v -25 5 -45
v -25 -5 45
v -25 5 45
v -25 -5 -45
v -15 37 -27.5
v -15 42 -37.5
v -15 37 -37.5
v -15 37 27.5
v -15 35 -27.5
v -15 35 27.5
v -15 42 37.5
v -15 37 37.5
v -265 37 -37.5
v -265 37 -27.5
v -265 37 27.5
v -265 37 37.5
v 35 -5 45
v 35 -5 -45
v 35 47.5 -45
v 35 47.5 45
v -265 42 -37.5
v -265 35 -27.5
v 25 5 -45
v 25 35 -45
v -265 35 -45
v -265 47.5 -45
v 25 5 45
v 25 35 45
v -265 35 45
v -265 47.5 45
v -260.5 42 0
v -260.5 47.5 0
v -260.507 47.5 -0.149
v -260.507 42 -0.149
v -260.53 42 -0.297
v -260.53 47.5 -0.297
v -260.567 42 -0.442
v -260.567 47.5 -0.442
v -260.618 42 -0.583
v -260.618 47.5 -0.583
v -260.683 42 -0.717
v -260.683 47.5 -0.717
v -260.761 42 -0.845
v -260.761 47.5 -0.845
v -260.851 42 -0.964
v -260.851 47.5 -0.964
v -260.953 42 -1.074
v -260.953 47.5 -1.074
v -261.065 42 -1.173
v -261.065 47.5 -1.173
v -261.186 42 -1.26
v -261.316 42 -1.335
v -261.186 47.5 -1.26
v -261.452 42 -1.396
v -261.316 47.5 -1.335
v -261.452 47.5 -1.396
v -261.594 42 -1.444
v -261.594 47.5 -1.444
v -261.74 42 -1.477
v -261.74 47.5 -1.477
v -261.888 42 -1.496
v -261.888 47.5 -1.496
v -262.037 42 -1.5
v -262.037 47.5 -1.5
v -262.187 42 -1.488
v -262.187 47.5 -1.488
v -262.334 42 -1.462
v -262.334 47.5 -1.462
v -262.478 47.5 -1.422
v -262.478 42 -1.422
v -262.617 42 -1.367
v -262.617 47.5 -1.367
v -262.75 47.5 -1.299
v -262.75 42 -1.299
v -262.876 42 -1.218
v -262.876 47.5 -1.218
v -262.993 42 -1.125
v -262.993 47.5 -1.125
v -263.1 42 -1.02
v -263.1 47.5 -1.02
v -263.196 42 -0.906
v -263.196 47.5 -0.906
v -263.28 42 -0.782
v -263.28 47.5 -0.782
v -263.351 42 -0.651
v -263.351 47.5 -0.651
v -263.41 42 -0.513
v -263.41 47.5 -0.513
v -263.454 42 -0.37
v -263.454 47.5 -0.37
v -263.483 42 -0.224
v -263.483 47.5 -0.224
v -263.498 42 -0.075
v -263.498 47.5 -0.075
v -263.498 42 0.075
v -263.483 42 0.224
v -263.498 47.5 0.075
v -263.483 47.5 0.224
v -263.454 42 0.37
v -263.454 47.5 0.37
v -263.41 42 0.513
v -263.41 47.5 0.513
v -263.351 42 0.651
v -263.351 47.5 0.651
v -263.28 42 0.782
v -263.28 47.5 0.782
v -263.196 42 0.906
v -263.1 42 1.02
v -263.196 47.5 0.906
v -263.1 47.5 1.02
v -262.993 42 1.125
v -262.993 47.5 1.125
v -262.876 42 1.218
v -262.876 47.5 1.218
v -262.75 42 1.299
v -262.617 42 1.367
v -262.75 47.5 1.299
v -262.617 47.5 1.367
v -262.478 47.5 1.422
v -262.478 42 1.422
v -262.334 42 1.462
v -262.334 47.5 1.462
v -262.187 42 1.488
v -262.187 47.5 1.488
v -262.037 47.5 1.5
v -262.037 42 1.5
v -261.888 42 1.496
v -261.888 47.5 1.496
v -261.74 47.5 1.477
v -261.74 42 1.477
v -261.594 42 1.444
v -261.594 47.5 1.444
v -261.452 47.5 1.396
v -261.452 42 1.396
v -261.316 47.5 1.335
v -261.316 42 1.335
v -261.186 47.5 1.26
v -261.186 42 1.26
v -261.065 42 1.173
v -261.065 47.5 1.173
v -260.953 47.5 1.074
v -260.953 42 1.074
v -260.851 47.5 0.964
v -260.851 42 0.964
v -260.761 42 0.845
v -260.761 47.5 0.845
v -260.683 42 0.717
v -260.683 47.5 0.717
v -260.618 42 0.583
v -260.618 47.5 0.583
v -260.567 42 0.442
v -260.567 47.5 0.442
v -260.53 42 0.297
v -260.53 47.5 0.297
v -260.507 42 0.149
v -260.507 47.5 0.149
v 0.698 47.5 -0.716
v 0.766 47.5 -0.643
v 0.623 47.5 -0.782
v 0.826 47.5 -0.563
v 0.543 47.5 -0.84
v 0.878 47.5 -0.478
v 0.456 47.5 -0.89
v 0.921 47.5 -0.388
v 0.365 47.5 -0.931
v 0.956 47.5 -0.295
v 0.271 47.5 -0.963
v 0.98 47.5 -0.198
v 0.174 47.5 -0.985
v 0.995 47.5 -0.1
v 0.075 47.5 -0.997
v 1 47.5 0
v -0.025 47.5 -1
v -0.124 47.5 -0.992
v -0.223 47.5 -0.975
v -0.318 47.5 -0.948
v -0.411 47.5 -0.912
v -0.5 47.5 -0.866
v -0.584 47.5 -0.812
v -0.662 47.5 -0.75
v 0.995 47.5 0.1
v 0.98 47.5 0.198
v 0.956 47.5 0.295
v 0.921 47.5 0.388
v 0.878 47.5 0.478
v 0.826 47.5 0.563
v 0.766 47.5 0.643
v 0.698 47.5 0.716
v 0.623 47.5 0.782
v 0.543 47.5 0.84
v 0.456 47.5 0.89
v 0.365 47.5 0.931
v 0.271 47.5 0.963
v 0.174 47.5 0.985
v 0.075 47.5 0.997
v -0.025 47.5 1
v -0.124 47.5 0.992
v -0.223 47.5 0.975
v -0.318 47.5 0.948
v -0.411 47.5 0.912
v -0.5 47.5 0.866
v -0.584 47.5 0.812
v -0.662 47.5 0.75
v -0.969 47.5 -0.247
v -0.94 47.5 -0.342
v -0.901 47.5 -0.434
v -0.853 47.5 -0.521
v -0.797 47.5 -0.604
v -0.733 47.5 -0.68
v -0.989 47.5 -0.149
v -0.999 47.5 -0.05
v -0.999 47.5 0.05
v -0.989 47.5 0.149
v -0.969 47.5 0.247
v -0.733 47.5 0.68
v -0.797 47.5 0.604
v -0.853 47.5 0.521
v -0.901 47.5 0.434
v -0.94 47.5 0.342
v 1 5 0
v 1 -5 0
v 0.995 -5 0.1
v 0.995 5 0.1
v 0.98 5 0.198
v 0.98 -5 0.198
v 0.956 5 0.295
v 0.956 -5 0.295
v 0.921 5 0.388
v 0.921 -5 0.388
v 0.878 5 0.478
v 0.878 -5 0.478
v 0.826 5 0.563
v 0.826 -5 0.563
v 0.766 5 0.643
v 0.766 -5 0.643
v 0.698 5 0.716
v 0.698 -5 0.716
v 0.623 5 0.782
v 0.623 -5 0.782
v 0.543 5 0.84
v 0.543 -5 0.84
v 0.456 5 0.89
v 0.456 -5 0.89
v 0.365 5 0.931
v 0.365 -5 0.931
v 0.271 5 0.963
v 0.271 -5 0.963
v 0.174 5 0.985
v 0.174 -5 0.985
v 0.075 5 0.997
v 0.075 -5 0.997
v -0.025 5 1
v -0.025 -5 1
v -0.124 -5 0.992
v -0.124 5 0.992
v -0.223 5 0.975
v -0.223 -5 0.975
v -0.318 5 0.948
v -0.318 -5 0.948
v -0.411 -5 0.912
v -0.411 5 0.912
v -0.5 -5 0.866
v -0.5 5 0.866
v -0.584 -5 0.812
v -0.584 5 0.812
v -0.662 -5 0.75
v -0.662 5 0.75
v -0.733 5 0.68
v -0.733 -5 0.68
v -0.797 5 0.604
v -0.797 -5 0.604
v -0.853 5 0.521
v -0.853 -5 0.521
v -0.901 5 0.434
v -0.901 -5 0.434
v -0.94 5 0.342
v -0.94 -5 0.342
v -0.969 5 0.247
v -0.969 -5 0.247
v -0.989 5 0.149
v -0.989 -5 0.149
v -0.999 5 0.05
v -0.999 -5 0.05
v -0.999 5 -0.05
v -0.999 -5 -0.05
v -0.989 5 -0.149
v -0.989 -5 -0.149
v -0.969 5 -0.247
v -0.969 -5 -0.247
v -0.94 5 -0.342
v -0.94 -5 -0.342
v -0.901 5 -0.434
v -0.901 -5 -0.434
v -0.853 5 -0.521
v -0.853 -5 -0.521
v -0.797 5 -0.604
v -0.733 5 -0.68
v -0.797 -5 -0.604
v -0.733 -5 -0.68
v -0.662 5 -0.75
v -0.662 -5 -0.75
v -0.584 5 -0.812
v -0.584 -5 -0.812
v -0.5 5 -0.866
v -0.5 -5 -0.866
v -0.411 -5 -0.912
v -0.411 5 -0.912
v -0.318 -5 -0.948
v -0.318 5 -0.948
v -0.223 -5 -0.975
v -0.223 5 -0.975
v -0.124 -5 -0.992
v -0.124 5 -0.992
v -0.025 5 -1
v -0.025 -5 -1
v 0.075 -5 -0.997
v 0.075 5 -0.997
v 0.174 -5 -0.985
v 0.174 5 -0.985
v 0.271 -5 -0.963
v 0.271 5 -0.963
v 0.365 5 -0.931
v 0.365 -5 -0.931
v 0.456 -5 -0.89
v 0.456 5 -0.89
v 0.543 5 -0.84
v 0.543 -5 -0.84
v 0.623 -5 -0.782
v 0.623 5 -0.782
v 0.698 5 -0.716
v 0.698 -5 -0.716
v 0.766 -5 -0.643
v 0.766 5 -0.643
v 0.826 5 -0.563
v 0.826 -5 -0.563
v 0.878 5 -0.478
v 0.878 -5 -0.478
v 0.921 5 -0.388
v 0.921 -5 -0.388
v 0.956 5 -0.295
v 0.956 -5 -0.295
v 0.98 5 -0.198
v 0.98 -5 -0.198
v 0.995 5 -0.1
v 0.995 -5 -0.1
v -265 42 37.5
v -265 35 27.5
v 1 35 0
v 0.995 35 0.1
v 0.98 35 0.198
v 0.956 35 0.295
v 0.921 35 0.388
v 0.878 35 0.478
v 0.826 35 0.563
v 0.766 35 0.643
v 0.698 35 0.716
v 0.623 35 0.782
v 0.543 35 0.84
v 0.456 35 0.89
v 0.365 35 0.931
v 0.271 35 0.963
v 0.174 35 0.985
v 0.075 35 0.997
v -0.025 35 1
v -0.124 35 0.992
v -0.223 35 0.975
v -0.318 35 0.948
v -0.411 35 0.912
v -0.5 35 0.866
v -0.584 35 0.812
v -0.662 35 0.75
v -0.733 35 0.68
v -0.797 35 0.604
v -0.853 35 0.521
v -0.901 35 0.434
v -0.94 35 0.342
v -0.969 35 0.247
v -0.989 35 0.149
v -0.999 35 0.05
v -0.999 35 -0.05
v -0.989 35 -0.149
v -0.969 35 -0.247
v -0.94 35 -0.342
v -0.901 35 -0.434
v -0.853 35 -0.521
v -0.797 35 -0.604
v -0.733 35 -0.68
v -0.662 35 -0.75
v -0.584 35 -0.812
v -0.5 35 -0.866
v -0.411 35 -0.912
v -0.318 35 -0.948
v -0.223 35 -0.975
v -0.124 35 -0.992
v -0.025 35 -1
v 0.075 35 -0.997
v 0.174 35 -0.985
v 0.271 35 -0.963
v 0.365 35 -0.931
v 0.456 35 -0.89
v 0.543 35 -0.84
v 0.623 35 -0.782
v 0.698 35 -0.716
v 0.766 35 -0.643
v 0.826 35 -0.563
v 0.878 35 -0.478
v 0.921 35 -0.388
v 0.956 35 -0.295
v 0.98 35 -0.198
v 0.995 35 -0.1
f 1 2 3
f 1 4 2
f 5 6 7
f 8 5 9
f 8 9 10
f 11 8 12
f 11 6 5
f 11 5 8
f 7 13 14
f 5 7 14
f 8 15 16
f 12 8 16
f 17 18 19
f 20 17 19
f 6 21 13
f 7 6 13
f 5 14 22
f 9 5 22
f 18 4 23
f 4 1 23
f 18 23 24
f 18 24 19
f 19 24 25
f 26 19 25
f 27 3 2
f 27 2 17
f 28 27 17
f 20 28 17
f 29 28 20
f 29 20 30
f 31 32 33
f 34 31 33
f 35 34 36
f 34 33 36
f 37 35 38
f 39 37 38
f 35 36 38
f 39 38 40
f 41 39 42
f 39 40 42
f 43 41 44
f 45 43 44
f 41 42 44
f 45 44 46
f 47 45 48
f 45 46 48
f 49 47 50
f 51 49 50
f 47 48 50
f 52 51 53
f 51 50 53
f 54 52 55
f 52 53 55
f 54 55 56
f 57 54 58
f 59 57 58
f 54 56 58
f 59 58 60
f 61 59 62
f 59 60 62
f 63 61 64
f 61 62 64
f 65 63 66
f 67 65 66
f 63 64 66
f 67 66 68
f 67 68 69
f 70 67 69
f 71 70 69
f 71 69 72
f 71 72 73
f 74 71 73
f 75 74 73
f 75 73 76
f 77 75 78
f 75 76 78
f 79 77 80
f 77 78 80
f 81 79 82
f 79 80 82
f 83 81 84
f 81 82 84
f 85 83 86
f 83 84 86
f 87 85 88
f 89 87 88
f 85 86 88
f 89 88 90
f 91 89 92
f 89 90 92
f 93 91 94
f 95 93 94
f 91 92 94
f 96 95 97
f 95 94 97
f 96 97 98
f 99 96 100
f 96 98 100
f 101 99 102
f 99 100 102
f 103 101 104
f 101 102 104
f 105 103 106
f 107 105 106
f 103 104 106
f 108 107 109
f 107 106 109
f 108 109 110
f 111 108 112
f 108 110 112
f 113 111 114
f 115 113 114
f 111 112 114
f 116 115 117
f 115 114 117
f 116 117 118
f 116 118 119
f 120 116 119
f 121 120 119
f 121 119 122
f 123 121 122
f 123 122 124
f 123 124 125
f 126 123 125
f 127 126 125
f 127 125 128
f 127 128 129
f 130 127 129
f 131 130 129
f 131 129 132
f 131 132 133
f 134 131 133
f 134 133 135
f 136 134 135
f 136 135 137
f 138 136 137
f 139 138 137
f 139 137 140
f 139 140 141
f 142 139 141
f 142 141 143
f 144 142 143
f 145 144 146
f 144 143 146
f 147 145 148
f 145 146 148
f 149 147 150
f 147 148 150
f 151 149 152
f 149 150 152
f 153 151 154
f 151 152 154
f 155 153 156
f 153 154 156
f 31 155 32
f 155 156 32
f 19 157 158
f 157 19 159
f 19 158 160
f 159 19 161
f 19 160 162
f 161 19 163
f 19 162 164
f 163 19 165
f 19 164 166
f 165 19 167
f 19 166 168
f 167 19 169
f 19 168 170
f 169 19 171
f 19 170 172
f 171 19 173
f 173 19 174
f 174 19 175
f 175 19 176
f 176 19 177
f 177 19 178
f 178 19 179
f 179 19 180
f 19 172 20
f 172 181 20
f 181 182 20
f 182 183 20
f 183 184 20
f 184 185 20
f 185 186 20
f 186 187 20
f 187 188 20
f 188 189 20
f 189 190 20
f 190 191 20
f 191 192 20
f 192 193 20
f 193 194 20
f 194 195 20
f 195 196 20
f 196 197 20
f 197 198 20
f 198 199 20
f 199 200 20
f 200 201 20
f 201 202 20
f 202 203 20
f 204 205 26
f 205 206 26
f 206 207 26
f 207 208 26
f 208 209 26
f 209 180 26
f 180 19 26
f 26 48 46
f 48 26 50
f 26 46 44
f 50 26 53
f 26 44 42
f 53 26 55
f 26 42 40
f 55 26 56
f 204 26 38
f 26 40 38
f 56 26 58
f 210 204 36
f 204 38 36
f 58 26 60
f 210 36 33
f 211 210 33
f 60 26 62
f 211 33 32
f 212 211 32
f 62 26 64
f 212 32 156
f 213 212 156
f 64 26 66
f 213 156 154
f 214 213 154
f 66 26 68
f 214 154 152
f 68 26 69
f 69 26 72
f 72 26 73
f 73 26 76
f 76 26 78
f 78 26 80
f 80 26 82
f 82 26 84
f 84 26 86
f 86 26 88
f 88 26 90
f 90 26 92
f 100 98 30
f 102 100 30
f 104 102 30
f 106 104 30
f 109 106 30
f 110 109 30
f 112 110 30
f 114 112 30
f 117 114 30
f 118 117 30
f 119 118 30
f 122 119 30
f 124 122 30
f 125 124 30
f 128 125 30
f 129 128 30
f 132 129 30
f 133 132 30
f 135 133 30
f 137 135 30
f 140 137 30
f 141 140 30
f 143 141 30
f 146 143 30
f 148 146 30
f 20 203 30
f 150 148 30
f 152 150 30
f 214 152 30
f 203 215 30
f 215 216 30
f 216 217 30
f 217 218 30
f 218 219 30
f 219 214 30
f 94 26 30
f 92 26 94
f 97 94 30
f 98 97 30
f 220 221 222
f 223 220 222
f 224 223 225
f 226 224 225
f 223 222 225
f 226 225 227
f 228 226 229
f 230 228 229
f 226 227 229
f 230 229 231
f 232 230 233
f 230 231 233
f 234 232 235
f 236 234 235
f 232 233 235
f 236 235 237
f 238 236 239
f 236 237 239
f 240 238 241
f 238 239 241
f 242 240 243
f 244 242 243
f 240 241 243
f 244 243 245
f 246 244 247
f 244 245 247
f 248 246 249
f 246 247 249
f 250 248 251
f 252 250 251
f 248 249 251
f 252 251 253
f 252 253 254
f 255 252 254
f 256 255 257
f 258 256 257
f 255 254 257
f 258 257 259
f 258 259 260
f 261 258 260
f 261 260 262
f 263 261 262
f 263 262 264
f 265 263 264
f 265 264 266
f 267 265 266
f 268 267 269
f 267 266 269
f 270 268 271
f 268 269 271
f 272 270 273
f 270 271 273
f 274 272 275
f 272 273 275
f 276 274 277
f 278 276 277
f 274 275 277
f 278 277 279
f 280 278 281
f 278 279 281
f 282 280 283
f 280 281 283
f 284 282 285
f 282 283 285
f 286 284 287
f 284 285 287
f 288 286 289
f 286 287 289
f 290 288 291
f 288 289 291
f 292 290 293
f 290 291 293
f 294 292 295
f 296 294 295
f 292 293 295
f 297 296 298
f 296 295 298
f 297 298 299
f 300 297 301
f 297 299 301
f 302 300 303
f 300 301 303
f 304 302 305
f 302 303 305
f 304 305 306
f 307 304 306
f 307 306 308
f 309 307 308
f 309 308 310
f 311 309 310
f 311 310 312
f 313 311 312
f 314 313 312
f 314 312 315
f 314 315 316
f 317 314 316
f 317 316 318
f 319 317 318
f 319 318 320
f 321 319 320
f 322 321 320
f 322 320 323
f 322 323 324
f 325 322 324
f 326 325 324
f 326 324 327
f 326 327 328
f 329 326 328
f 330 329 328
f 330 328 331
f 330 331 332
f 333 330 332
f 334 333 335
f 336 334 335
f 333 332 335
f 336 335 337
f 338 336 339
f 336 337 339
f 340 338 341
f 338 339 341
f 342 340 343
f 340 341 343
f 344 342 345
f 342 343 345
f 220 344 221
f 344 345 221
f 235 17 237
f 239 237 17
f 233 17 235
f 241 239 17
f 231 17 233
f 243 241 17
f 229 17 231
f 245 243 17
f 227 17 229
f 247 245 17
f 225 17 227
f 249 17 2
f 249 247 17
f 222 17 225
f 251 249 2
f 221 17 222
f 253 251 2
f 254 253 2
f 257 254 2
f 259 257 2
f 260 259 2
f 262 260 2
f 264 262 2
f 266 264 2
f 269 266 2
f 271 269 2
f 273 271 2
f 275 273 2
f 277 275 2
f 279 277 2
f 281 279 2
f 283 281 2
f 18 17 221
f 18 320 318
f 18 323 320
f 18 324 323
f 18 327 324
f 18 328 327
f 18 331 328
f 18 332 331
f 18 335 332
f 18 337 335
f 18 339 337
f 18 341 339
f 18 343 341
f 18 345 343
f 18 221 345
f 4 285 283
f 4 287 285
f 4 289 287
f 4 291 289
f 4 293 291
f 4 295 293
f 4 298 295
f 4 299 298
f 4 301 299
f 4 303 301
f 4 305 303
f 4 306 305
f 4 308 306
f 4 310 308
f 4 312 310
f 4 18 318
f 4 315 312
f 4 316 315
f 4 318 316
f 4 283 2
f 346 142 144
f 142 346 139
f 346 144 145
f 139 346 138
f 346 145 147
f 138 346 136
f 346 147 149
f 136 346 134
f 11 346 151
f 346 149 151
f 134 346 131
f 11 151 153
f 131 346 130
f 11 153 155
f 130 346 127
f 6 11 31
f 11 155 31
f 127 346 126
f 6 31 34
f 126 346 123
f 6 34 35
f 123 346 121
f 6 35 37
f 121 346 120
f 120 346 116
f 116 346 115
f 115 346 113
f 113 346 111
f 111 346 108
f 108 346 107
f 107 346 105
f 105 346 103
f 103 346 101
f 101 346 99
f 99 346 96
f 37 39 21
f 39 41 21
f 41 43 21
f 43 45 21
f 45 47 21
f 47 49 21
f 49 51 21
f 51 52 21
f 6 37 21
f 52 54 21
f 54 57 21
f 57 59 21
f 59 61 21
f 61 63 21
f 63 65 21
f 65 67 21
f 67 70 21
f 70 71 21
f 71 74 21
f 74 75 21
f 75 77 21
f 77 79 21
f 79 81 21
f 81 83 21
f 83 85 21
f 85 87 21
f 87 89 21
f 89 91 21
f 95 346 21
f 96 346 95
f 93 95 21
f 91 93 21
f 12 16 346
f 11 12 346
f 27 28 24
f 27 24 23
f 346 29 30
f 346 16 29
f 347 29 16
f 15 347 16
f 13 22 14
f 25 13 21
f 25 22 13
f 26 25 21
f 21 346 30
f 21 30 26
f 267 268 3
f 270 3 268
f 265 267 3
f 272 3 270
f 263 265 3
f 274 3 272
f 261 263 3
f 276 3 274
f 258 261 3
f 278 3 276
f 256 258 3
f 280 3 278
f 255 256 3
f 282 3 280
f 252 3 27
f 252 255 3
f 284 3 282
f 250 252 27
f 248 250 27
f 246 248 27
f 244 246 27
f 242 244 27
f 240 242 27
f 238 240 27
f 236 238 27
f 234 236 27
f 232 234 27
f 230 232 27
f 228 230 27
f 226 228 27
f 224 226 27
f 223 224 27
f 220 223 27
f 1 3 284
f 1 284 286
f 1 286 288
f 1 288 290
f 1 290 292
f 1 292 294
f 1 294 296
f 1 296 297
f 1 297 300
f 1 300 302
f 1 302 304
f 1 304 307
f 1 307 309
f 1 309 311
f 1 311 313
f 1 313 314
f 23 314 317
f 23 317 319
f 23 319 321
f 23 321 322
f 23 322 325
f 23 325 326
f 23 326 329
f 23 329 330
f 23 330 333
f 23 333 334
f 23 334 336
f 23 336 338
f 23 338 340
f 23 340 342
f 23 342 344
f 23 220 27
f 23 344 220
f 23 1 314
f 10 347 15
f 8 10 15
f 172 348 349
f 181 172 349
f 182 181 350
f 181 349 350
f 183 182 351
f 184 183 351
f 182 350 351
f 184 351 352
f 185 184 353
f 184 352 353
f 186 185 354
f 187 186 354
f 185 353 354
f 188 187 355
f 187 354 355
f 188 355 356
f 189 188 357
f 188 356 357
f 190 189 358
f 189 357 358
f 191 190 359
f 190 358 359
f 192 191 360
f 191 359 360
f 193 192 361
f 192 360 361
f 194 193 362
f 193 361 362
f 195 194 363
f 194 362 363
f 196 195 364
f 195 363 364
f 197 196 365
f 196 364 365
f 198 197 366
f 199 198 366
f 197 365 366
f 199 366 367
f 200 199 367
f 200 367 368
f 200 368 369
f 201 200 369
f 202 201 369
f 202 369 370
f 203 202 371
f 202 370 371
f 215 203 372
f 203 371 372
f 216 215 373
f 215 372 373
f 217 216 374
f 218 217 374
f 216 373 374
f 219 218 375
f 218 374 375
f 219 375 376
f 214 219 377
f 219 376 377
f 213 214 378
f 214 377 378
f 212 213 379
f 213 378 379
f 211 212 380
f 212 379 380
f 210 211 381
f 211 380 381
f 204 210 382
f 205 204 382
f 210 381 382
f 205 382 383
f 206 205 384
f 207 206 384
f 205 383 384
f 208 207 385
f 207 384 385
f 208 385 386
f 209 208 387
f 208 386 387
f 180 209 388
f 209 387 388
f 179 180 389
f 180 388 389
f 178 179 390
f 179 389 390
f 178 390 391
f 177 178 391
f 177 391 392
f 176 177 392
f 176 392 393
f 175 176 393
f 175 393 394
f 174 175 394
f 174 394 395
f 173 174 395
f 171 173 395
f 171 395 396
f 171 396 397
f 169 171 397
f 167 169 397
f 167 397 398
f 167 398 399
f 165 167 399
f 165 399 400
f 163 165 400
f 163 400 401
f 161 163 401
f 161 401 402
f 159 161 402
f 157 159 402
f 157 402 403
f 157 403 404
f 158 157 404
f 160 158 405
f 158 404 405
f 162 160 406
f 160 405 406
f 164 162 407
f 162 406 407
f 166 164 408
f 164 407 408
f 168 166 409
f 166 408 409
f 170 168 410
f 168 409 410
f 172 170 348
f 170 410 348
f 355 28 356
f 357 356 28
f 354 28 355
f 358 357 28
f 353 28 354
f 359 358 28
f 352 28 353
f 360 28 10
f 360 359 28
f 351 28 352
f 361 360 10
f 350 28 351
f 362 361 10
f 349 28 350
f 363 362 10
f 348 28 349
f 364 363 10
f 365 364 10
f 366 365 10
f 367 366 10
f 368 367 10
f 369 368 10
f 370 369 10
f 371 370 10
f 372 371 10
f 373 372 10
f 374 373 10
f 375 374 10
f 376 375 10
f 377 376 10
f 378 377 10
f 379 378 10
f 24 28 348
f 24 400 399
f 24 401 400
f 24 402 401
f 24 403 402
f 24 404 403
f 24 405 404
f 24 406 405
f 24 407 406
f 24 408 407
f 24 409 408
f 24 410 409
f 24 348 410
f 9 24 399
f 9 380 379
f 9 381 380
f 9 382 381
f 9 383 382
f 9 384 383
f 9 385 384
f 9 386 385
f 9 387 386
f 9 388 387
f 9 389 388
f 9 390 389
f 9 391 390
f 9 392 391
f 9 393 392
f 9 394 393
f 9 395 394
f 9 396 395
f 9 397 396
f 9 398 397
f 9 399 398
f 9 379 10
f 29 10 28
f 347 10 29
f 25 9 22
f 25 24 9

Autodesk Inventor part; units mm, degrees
ref_plane "YZ Plane" through (0, 0, 0) normal (1, 0, 0) x (0, 1, 0)
ref_plane "XZ Plane" through (0, 0, 0) normal (0, 1, 0) x (-1, 0, 0)
ref_plane "XY Plane" through (0, 0, 0) normal (0, 0, 1) x (1, 0, 0)
sketch "Sketch1" plane through (0, 0, 0) normal (0, 0, 1) x (1, 0, 0)
  line L0 (25, -5) -> (-25, -5)
  line L1 (-25, -5) -> (-25, 5)
  line L2 (-25, 5) -> (25, 5)
  line L3 (25, -5) -> (-25, 5) construction
  line L4 (-25, -5) -> (25, 5) construction
  line L5 (25, -5) -> (35, -5)
  line L6 (35, -5) -> (35, 35)
  line L7 (25, 35) -> (25, 5)
  line L8 (25, 35) -> (-265, 35)
  line L9 (-265, 35) -> (-265, 50)
  line L10 (-265, 50) -> (35, 50)
  line L11 (35, 50) -> (35, 35)
  point P0 (0, 0)
  dimension "d0" = 50
  dimension "d1" = 10
  dimension "d2" = 10
  dimension "d3" = 40
  dimension "d4" = 300
  dimension "d5" = 15
extrude "Extrusion1" add sketch "Sketch1" along normal mid plane 90
sketch "Sketch4" plane through (-25, -5, 45) normal (0, -1, 0) x (1, 0, 0)
  circle A0 centre (25, -45) radius 1
  dimension "d17" = 2
extrude "Extrusion4" cut sketch "Sketch4" against normal through all
sketch "Sketch5" plane through (-265, 35, 45) normal (-1, 0, 0) x (0, 0, 1)
  line L0 (-7.5, 7) -> (-82.5, 7)
  line L1 (-82.5, 7) -> (-82.5, 2)
  line L2 (-7.5, 2) -> (-7.5, 7)
  line L3 (-7.5, 7) -> (-82.5, 2) construction
  line L4 (-82.5, 7) -> (-7.5, 2) construction
  line L5 (-72.5, 2) -> (-72.5, 0)
  line L6 (-72.5, 0) -> (-17.5, 0)
  line L7 (-17.5, 0) -> (-17.5, 2)
  line L8 (-82.5, 2) -> (-72.5, 2)
  line L9 (-17.5, 2) -> (-7.5, 2)
  point P0 (-45, -35)
  point P1 (-45, 4.5)
  dimension "d32" = 75
  dimension "d33" = 5
  dimension "d34" = 55
sketch "Sketch6" plane through (-265, 35, 45) normal (-1, 0, 0) x (0, 0, 1)
  line L0 (-90, 15) -> (0, 15) projected
  line L1 (0, 15) -> (-90, 15)
  line L2 (-90, 15) -> (-90, 12.5)
  line L3 (-90, 12.5) -> (0, 12.5)
  line L4 (0, 12.5) -> (0, 15)
  point P0 (-45, -35)
  dimension "d25" = 90
  dimension "d26" = 2.5
extrude "Extrusion6" cut sketch "Sketch6" against normal blind 300
sketch "Sketch7" plane through (-265, 47.5, 45) normal (0, 1, 0) x (1, 0, 0)
  circle A0 centre (3, 45) radius 1.5
  point P0 (265, 45)
  dimension "d29" = 3
extrude "Extrusion7" cut sketch "Sketch7" against normal blind 60
extrude "Extrusion8" cut sketch "Sketch5" against normal blind 250
properties part number "kamera_feste"
